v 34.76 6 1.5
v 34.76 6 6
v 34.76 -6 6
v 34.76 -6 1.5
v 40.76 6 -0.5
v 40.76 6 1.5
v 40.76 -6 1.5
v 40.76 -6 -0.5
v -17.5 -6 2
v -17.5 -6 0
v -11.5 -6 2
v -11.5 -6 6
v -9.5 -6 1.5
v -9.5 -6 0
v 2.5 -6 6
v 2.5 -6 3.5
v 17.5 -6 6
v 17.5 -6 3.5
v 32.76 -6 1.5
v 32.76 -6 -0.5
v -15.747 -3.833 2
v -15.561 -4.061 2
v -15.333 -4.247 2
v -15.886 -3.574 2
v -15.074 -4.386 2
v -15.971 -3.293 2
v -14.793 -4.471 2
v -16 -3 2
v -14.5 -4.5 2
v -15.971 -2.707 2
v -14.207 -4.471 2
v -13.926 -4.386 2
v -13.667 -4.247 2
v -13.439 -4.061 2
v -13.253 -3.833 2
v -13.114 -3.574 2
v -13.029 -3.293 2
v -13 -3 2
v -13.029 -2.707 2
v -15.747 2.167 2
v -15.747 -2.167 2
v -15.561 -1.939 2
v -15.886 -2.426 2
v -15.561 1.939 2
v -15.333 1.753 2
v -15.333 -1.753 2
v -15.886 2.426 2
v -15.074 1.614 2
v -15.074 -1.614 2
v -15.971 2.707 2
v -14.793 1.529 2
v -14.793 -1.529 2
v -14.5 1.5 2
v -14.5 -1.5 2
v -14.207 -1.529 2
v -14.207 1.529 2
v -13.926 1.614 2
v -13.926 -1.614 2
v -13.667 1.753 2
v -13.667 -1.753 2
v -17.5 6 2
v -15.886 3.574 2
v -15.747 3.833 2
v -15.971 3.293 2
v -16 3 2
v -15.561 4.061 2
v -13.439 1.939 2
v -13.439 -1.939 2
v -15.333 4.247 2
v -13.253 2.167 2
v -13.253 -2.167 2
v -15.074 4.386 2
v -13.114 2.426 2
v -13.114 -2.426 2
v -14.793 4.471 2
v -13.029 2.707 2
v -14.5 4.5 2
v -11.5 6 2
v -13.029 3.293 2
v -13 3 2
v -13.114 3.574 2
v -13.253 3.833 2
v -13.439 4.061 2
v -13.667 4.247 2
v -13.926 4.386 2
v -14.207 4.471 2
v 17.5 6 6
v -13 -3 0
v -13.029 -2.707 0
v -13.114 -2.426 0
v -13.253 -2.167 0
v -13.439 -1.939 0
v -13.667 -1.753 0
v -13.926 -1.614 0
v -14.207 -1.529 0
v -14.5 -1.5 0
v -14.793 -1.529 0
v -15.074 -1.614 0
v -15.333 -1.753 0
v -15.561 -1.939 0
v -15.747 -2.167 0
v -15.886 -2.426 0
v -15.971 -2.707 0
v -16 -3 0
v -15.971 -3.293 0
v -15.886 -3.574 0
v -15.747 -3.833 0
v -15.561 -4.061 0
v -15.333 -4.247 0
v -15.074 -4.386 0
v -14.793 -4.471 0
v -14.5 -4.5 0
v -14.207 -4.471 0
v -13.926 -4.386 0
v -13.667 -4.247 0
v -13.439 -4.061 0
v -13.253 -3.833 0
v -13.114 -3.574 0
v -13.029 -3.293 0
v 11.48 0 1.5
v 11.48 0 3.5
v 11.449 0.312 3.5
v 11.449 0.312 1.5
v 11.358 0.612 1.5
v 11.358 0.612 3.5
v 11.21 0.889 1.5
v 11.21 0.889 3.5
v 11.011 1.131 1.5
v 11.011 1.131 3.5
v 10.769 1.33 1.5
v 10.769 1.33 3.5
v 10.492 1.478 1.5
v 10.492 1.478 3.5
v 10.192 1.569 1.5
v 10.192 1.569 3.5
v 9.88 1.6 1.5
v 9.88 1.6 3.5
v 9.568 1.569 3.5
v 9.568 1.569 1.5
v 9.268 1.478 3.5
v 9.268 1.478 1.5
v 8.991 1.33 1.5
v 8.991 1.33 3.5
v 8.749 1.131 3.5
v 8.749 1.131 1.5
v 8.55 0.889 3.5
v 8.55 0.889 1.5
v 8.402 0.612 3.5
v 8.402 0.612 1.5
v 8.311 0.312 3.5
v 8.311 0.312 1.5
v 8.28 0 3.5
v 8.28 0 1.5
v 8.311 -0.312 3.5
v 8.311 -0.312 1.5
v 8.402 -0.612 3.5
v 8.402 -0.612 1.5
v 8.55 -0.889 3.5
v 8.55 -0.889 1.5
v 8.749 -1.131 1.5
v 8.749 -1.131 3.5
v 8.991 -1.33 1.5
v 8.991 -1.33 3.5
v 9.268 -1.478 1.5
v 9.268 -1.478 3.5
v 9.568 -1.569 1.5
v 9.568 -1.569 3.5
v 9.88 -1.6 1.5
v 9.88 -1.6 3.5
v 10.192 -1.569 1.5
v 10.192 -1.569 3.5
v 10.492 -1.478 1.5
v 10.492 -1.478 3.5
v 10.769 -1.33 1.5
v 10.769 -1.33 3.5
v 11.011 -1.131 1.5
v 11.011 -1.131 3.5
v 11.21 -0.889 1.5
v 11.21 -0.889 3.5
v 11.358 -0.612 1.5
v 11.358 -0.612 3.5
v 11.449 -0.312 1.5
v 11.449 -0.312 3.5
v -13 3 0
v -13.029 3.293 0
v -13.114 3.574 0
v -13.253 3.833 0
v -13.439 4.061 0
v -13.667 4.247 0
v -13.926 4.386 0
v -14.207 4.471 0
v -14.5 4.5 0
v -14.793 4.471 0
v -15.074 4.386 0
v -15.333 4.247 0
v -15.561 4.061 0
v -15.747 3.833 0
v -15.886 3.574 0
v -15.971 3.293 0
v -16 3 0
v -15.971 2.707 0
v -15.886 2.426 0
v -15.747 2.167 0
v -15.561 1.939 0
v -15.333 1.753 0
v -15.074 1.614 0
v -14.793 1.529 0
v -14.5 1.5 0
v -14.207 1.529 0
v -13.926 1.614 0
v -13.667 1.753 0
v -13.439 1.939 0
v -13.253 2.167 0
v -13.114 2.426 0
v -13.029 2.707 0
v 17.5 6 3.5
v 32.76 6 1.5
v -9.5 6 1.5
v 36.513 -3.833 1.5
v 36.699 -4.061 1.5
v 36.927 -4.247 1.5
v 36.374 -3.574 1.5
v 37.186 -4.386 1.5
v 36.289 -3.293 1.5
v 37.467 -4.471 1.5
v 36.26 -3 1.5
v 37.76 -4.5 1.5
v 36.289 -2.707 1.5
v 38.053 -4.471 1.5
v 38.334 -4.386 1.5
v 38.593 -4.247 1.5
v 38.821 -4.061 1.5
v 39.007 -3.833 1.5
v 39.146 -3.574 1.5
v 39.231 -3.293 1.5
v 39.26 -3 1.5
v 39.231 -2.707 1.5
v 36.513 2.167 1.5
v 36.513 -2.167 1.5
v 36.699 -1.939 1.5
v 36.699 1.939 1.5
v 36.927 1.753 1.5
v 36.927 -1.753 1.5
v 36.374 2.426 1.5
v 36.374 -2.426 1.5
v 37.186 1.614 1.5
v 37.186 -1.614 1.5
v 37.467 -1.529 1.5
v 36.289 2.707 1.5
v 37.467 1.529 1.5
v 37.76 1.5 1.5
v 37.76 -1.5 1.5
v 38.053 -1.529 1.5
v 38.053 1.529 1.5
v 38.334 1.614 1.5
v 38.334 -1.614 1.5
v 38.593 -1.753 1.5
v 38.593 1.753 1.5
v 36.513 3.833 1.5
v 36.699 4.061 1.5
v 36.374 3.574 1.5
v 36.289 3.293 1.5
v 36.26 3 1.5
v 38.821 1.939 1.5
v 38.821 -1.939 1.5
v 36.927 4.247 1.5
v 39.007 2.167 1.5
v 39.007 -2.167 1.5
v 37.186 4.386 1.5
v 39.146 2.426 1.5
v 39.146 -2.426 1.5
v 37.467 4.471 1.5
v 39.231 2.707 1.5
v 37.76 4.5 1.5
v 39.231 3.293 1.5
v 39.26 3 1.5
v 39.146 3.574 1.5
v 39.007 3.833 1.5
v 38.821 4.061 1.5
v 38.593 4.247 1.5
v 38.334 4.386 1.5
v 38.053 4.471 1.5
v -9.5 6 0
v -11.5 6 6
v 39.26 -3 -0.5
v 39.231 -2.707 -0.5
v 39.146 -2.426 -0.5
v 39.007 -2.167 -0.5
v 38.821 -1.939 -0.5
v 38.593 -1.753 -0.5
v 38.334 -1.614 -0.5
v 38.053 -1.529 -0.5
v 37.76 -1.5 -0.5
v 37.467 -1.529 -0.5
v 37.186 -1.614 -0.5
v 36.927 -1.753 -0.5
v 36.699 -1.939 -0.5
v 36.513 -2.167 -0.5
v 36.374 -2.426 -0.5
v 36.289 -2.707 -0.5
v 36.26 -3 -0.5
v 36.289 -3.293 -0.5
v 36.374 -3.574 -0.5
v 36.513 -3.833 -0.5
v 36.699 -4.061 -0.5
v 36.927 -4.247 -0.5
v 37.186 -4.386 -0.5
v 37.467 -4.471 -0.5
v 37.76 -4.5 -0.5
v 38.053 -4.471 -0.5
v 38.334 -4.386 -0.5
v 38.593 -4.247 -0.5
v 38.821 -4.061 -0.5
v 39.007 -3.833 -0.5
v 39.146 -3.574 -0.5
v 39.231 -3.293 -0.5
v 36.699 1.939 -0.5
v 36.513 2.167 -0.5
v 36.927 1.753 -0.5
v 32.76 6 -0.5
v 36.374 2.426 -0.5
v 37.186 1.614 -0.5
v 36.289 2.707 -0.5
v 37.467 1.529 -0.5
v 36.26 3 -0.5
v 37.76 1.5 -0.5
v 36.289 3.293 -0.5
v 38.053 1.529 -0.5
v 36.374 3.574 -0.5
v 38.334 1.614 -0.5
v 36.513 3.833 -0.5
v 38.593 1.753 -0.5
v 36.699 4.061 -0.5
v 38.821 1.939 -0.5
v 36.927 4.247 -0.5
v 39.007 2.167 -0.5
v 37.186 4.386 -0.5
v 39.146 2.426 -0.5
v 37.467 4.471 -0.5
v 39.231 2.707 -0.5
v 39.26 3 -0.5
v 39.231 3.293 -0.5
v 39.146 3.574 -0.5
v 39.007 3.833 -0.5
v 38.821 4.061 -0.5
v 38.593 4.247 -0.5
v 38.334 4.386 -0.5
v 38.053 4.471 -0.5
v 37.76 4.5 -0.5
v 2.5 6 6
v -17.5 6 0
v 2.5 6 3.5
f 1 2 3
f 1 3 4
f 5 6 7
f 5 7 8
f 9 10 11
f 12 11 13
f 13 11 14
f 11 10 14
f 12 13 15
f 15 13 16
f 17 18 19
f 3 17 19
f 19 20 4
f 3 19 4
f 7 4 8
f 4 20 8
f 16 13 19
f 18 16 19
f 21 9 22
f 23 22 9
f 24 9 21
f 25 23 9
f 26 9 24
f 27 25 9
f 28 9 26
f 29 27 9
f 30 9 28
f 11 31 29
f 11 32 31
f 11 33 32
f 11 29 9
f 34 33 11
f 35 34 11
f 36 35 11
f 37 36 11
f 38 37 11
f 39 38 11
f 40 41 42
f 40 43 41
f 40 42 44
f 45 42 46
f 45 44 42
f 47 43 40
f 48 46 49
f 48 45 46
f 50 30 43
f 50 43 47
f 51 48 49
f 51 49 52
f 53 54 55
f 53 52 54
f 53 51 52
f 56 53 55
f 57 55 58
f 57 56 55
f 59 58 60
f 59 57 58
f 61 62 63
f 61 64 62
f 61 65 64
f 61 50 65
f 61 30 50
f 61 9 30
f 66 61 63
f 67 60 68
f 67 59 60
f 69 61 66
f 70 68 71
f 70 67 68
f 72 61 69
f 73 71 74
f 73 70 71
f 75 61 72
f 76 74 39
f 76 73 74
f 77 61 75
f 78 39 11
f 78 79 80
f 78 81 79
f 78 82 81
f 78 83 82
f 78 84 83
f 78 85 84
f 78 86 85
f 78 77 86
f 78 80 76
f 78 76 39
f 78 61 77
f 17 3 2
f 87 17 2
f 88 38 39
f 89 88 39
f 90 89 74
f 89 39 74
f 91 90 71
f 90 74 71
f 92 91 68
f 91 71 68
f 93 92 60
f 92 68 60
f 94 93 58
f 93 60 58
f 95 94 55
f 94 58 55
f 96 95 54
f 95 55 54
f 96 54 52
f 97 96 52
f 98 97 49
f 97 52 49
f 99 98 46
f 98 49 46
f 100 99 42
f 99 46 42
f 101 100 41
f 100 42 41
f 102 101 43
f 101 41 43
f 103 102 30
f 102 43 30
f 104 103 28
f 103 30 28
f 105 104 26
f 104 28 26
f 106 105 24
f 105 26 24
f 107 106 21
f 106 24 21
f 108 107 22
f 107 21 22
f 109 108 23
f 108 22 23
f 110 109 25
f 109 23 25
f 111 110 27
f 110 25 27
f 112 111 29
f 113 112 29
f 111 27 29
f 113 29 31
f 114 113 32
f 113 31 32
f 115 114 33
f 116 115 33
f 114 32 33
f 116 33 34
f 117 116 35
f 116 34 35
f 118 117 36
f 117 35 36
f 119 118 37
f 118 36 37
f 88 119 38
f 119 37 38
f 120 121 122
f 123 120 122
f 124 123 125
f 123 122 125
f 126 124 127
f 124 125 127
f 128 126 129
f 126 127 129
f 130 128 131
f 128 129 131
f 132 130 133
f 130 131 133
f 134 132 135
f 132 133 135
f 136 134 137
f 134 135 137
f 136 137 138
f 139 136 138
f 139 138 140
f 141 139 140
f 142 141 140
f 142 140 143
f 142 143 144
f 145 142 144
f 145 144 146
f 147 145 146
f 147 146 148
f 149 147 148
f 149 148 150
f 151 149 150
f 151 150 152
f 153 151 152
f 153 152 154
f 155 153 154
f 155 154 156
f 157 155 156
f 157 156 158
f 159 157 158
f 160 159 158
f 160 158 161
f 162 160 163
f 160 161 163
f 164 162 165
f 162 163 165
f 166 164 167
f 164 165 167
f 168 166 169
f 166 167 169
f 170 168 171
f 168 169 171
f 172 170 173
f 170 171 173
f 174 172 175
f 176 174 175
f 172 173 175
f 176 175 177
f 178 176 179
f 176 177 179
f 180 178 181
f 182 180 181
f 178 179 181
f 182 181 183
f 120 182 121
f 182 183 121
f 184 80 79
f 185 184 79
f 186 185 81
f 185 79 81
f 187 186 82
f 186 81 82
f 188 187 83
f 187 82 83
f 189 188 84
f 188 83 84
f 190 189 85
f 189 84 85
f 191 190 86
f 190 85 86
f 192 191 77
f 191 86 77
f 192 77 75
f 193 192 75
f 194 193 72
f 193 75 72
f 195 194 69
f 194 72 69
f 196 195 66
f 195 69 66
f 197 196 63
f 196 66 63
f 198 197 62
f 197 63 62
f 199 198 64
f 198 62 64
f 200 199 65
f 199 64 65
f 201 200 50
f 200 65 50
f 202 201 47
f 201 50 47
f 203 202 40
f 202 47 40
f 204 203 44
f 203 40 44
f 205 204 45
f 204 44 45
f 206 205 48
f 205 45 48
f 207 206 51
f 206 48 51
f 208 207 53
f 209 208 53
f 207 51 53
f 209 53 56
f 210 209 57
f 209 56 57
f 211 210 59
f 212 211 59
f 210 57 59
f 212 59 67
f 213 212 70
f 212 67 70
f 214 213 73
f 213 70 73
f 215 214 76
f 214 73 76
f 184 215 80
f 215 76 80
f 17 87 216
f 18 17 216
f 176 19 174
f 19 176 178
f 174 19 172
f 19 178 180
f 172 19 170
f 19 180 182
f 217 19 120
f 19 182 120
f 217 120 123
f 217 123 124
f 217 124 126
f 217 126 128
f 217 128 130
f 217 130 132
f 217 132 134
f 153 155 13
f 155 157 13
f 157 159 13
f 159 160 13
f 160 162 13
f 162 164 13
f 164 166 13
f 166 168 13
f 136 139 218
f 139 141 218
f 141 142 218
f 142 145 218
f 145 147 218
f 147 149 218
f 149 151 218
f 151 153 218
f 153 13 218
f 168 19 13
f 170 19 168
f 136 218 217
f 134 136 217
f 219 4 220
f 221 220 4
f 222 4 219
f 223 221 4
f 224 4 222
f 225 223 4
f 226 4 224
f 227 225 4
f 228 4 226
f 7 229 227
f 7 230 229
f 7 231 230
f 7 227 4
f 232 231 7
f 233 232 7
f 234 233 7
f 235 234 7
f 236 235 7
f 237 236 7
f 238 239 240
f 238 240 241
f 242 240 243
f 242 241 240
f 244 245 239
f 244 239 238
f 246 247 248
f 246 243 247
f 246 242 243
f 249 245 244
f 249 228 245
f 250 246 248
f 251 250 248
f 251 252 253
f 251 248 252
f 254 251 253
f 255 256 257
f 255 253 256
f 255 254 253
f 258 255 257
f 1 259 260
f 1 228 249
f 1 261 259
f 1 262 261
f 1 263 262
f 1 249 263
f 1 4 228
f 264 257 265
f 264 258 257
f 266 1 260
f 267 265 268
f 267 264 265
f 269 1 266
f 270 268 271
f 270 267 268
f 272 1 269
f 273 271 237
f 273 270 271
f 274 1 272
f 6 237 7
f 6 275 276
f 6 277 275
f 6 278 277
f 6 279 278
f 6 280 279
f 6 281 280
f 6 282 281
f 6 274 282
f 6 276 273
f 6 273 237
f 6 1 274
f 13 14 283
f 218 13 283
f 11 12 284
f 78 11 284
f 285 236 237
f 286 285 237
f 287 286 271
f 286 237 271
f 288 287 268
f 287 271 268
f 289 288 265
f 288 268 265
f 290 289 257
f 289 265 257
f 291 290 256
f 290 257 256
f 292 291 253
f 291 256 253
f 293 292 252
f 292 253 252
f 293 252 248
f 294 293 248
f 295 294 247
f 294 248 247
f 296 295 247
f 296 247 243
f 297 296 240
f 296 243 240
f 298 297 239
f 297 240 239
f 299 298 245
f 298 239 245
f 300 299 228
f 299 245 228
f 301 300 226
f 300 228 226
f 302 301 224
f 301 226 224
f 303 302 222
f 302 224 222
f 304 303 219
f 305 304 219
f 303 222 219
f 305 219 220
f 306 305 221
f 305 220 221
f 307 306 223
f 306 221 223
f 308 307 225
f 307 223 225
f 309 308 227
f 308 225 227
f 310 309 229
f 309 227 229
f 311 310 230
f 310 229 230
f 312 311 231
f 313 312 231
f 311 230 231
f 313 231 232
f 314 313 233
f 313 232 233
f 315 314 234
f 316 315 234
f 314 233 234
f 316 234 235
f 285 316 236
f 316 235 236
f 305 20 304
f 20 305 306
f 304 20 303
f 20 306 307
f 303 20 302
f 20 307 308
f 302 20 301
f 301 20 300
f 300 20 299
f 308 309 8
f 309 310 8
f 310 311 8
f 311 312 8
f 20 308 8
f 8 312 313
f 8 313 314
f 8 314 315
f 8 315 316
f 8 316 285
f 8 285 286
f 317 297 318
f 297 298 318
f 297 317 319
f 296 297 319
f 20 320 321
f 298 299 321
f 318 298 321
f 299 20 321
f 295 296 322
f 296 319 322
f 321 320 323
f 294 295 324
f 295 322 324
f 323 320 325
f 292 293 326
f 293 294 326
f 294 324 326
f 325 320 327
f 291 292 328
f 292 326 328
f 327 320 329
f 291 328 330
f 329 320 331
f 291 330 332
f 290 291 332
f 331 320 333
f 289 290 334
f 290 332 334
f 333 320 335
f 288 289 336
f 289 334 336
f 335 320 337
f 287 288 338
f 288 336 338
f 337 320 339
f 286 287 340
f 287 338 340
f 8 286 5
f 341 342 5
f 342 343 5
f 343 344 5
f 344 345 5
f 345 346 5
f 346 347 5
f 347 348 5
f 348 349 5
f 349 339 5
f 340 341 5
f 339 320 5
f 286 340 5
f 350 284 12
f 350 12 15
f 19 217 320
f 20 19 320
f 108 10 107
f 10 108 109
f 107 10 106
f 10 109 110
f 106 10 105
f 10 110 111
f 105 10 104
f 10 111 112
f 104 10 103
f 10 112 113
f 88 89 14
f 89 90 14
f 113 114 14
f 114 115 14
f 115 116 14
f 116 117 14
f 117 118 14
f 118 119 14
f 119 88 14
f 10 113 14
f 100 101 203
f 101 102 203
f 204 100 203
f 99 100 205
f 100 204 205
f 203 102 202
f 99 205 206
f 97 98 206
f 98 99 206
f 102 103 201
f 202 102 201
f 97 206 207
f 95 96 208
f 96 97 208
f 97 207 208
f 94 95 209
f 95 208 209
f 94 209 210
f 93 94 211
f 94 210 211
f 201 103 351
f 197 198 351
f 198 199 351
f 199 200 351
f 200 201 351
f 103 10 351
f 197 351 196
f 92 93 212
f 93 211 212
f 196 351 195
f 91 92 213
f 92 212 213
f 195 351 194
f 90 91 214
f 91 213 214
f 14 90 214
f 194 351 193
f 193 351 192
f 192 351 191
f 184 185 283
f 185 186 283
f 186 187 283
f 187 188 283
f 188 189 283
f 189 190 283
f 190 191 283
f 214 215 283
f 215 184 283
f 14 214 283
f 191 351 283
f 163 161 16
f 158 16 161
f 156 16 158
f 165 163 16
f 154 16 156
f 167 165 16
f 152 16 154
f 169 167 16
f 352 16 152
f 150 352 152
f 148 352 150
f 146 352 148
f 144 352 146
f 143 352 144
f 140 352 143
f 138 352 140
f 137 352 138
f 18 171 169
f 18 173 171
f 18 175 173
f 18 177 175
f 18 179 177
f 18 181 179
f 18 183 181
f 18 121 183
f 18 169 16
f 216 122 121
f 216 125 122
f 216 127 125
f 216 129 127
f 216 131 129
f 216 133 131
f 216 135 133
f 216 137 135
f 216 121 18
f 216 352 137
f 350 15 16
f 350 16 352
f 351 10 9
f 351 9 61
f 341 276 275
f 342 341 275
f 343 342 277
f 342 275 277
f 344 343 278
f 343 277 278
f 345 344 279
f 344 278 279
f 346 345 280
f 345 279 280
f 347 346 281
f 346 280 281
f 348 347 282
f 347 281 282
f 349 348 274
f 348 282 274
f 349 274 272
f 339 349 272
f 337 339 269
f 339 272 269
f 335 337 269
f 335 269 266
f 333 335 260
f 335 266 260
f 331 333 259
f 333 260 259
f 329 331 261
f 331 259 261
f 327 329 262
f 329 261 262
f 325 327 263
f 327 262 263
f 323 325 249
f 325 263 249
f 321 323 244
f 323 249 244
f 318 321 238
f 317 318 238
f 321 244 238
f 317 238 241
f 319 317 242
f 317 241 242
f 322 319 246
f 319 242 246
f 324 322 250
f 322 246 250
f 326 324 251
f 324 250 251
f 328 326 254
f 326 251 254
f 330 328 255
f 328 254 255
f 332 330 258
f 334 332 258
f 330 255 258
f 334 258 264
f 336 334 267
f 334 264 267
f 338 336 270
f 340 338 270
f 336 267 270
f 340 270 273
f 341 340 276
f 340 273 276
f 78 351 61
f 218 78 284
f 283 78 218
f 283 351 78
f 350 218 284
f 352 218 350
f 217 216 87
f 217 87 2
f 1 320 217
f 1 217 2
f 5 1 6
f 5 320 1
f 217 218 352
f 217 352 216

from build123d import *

# Parameters (mm, degrees)
SKETCH1_W       = 35
SKETCH1_H       = 12
EXTRUDE1_DEPTH  = 6
SKETCH2_W       = 6
SKETCH2_H       = 12
EXTRUDE2_DEPTH  = 4
SKETCH3_R       = 1.5
EXTRUDE3_DEPTH  = 2
SKETCH4_R       = 1.6
EXTRUDE4_DEPTH  = 6
SKETCH7_W       = 15
SKETCH7_H       = 12
EXTRUDE6_DEPTH  = 2.5
SKETCH8_W       = 27
SKETCH8_H       = 12
EXTRUDE7_DEPTH  = 1.5
SKETCH9_W       = 4.5
SKETCH9_H       = 12
EXTRUDE8_DEPTH  = 17.26
SKETCH10_W      = 8
SKETCH10_H      = 2
EXTRUDE9_DEPTH  = 12
SKETCH12_R      = 1.5
EXTRUDE10_DEPTH = 2


with BuildPart() as part:
    # Sketch1 → Extrude1 (new body)
    with BuildSketch(Plane.XY):
        Rectangle(SKETCH1_W, SKETCH1_H)
    extrude(amount=EXTRUDE1_DEPTH)

    # Sketch2 → Extrude2 (cut)
    with BuildSketch(Plane.XY.offset(6)):
        with Locations((-14.5, 0)):
            Rectangle(SKETCH2_W, SKETCH2_H)
    extrude(amount=-EXTRUDE2_DEPTH, mode=Mode.SUBTRACT)

    # Sketch3 → Extrude3 (cut)
    with BuildSketch(Plane.XY.offset(2)):
        with Locations((-14.5, 3)):
            Circle(SKETCH3_R)
        with Locations((-14.5, -3)):
            Circle(SKETCH3_R)
    extrude(amount=-EXTRUDE3_DEPTH, mode=Mode.SUBTRACT)

    # Sketch4 → Extrude4 (cut)
    with BuildSketch(Plane.XY.offset(6)):
        with Locations((9.88, 0)):
            Circle(SKETCH4_R)
    extrude(amount=-EXTRUDE4_DEPTH, mode=Mode.SUBTRACT)

    # Sketch7 → Extrude6 (cut)
    with BuildSketch(Plane.XY.offset(6)):
        with Locations((10, 0)):
            Rectangle(SKETCH7_W, SKETCH7_H)
    extrude(amount=-EXTRUDE6_DEPTH, mode=Mode.SUBTRACT)

    # Sketch8 → Extrude7 (cut)
    with BuildSketch(Plane(origin=(0, 0, 0), x_dir=(-1, 0, 0), z_dir=(0, 0, -1))):
        with Locations((-4, 0)):
            Rectangle(SKETCH8_W, SKETCH8_H)
    extrude(amount=-EXTRUDE7_DEPTH, mode=Mode.SUBTRACT)

    # Sketch9 → Extrude8 (add)
    with BuildSketch(Plane(origin=(17.5, 0, 0), x_dir=(0, 0, -1), z_dir=(1, 0, 0))):
        with Locations((-3.75, 0)):
            Rectangle(SKETCH9_W, SKETCH9_H)
    extrude(amount=EXTRUDE8_DEPTH)

    # Sketch10 → Extrude9 (add)
    with BuildSketch(Plane(origin=(0, 6, 0), x_dir=(1, 0, 0), z_dir=(0, 1, 0))):
        with Locations((36.76, -0.5)):
            Rectangle(SKETCH10_W, SKETCH10_H)
    extrude(amount=-EXTRUDE9_DEPTH)

    # Sketch12 → Extrude10 (cut)
    with BuildSketch(Plane.XY.offset(1.5)):
        with Locations((37.76, 3)):
            Circle(SKETCH12_R)
        with Locations((37.76, -3)):
            Circle(SKETCH12_R)
    extrude(amount=-EXTRUDE10_DEPTH, mode=Mode.SUBTRACT)


solid = part.part
